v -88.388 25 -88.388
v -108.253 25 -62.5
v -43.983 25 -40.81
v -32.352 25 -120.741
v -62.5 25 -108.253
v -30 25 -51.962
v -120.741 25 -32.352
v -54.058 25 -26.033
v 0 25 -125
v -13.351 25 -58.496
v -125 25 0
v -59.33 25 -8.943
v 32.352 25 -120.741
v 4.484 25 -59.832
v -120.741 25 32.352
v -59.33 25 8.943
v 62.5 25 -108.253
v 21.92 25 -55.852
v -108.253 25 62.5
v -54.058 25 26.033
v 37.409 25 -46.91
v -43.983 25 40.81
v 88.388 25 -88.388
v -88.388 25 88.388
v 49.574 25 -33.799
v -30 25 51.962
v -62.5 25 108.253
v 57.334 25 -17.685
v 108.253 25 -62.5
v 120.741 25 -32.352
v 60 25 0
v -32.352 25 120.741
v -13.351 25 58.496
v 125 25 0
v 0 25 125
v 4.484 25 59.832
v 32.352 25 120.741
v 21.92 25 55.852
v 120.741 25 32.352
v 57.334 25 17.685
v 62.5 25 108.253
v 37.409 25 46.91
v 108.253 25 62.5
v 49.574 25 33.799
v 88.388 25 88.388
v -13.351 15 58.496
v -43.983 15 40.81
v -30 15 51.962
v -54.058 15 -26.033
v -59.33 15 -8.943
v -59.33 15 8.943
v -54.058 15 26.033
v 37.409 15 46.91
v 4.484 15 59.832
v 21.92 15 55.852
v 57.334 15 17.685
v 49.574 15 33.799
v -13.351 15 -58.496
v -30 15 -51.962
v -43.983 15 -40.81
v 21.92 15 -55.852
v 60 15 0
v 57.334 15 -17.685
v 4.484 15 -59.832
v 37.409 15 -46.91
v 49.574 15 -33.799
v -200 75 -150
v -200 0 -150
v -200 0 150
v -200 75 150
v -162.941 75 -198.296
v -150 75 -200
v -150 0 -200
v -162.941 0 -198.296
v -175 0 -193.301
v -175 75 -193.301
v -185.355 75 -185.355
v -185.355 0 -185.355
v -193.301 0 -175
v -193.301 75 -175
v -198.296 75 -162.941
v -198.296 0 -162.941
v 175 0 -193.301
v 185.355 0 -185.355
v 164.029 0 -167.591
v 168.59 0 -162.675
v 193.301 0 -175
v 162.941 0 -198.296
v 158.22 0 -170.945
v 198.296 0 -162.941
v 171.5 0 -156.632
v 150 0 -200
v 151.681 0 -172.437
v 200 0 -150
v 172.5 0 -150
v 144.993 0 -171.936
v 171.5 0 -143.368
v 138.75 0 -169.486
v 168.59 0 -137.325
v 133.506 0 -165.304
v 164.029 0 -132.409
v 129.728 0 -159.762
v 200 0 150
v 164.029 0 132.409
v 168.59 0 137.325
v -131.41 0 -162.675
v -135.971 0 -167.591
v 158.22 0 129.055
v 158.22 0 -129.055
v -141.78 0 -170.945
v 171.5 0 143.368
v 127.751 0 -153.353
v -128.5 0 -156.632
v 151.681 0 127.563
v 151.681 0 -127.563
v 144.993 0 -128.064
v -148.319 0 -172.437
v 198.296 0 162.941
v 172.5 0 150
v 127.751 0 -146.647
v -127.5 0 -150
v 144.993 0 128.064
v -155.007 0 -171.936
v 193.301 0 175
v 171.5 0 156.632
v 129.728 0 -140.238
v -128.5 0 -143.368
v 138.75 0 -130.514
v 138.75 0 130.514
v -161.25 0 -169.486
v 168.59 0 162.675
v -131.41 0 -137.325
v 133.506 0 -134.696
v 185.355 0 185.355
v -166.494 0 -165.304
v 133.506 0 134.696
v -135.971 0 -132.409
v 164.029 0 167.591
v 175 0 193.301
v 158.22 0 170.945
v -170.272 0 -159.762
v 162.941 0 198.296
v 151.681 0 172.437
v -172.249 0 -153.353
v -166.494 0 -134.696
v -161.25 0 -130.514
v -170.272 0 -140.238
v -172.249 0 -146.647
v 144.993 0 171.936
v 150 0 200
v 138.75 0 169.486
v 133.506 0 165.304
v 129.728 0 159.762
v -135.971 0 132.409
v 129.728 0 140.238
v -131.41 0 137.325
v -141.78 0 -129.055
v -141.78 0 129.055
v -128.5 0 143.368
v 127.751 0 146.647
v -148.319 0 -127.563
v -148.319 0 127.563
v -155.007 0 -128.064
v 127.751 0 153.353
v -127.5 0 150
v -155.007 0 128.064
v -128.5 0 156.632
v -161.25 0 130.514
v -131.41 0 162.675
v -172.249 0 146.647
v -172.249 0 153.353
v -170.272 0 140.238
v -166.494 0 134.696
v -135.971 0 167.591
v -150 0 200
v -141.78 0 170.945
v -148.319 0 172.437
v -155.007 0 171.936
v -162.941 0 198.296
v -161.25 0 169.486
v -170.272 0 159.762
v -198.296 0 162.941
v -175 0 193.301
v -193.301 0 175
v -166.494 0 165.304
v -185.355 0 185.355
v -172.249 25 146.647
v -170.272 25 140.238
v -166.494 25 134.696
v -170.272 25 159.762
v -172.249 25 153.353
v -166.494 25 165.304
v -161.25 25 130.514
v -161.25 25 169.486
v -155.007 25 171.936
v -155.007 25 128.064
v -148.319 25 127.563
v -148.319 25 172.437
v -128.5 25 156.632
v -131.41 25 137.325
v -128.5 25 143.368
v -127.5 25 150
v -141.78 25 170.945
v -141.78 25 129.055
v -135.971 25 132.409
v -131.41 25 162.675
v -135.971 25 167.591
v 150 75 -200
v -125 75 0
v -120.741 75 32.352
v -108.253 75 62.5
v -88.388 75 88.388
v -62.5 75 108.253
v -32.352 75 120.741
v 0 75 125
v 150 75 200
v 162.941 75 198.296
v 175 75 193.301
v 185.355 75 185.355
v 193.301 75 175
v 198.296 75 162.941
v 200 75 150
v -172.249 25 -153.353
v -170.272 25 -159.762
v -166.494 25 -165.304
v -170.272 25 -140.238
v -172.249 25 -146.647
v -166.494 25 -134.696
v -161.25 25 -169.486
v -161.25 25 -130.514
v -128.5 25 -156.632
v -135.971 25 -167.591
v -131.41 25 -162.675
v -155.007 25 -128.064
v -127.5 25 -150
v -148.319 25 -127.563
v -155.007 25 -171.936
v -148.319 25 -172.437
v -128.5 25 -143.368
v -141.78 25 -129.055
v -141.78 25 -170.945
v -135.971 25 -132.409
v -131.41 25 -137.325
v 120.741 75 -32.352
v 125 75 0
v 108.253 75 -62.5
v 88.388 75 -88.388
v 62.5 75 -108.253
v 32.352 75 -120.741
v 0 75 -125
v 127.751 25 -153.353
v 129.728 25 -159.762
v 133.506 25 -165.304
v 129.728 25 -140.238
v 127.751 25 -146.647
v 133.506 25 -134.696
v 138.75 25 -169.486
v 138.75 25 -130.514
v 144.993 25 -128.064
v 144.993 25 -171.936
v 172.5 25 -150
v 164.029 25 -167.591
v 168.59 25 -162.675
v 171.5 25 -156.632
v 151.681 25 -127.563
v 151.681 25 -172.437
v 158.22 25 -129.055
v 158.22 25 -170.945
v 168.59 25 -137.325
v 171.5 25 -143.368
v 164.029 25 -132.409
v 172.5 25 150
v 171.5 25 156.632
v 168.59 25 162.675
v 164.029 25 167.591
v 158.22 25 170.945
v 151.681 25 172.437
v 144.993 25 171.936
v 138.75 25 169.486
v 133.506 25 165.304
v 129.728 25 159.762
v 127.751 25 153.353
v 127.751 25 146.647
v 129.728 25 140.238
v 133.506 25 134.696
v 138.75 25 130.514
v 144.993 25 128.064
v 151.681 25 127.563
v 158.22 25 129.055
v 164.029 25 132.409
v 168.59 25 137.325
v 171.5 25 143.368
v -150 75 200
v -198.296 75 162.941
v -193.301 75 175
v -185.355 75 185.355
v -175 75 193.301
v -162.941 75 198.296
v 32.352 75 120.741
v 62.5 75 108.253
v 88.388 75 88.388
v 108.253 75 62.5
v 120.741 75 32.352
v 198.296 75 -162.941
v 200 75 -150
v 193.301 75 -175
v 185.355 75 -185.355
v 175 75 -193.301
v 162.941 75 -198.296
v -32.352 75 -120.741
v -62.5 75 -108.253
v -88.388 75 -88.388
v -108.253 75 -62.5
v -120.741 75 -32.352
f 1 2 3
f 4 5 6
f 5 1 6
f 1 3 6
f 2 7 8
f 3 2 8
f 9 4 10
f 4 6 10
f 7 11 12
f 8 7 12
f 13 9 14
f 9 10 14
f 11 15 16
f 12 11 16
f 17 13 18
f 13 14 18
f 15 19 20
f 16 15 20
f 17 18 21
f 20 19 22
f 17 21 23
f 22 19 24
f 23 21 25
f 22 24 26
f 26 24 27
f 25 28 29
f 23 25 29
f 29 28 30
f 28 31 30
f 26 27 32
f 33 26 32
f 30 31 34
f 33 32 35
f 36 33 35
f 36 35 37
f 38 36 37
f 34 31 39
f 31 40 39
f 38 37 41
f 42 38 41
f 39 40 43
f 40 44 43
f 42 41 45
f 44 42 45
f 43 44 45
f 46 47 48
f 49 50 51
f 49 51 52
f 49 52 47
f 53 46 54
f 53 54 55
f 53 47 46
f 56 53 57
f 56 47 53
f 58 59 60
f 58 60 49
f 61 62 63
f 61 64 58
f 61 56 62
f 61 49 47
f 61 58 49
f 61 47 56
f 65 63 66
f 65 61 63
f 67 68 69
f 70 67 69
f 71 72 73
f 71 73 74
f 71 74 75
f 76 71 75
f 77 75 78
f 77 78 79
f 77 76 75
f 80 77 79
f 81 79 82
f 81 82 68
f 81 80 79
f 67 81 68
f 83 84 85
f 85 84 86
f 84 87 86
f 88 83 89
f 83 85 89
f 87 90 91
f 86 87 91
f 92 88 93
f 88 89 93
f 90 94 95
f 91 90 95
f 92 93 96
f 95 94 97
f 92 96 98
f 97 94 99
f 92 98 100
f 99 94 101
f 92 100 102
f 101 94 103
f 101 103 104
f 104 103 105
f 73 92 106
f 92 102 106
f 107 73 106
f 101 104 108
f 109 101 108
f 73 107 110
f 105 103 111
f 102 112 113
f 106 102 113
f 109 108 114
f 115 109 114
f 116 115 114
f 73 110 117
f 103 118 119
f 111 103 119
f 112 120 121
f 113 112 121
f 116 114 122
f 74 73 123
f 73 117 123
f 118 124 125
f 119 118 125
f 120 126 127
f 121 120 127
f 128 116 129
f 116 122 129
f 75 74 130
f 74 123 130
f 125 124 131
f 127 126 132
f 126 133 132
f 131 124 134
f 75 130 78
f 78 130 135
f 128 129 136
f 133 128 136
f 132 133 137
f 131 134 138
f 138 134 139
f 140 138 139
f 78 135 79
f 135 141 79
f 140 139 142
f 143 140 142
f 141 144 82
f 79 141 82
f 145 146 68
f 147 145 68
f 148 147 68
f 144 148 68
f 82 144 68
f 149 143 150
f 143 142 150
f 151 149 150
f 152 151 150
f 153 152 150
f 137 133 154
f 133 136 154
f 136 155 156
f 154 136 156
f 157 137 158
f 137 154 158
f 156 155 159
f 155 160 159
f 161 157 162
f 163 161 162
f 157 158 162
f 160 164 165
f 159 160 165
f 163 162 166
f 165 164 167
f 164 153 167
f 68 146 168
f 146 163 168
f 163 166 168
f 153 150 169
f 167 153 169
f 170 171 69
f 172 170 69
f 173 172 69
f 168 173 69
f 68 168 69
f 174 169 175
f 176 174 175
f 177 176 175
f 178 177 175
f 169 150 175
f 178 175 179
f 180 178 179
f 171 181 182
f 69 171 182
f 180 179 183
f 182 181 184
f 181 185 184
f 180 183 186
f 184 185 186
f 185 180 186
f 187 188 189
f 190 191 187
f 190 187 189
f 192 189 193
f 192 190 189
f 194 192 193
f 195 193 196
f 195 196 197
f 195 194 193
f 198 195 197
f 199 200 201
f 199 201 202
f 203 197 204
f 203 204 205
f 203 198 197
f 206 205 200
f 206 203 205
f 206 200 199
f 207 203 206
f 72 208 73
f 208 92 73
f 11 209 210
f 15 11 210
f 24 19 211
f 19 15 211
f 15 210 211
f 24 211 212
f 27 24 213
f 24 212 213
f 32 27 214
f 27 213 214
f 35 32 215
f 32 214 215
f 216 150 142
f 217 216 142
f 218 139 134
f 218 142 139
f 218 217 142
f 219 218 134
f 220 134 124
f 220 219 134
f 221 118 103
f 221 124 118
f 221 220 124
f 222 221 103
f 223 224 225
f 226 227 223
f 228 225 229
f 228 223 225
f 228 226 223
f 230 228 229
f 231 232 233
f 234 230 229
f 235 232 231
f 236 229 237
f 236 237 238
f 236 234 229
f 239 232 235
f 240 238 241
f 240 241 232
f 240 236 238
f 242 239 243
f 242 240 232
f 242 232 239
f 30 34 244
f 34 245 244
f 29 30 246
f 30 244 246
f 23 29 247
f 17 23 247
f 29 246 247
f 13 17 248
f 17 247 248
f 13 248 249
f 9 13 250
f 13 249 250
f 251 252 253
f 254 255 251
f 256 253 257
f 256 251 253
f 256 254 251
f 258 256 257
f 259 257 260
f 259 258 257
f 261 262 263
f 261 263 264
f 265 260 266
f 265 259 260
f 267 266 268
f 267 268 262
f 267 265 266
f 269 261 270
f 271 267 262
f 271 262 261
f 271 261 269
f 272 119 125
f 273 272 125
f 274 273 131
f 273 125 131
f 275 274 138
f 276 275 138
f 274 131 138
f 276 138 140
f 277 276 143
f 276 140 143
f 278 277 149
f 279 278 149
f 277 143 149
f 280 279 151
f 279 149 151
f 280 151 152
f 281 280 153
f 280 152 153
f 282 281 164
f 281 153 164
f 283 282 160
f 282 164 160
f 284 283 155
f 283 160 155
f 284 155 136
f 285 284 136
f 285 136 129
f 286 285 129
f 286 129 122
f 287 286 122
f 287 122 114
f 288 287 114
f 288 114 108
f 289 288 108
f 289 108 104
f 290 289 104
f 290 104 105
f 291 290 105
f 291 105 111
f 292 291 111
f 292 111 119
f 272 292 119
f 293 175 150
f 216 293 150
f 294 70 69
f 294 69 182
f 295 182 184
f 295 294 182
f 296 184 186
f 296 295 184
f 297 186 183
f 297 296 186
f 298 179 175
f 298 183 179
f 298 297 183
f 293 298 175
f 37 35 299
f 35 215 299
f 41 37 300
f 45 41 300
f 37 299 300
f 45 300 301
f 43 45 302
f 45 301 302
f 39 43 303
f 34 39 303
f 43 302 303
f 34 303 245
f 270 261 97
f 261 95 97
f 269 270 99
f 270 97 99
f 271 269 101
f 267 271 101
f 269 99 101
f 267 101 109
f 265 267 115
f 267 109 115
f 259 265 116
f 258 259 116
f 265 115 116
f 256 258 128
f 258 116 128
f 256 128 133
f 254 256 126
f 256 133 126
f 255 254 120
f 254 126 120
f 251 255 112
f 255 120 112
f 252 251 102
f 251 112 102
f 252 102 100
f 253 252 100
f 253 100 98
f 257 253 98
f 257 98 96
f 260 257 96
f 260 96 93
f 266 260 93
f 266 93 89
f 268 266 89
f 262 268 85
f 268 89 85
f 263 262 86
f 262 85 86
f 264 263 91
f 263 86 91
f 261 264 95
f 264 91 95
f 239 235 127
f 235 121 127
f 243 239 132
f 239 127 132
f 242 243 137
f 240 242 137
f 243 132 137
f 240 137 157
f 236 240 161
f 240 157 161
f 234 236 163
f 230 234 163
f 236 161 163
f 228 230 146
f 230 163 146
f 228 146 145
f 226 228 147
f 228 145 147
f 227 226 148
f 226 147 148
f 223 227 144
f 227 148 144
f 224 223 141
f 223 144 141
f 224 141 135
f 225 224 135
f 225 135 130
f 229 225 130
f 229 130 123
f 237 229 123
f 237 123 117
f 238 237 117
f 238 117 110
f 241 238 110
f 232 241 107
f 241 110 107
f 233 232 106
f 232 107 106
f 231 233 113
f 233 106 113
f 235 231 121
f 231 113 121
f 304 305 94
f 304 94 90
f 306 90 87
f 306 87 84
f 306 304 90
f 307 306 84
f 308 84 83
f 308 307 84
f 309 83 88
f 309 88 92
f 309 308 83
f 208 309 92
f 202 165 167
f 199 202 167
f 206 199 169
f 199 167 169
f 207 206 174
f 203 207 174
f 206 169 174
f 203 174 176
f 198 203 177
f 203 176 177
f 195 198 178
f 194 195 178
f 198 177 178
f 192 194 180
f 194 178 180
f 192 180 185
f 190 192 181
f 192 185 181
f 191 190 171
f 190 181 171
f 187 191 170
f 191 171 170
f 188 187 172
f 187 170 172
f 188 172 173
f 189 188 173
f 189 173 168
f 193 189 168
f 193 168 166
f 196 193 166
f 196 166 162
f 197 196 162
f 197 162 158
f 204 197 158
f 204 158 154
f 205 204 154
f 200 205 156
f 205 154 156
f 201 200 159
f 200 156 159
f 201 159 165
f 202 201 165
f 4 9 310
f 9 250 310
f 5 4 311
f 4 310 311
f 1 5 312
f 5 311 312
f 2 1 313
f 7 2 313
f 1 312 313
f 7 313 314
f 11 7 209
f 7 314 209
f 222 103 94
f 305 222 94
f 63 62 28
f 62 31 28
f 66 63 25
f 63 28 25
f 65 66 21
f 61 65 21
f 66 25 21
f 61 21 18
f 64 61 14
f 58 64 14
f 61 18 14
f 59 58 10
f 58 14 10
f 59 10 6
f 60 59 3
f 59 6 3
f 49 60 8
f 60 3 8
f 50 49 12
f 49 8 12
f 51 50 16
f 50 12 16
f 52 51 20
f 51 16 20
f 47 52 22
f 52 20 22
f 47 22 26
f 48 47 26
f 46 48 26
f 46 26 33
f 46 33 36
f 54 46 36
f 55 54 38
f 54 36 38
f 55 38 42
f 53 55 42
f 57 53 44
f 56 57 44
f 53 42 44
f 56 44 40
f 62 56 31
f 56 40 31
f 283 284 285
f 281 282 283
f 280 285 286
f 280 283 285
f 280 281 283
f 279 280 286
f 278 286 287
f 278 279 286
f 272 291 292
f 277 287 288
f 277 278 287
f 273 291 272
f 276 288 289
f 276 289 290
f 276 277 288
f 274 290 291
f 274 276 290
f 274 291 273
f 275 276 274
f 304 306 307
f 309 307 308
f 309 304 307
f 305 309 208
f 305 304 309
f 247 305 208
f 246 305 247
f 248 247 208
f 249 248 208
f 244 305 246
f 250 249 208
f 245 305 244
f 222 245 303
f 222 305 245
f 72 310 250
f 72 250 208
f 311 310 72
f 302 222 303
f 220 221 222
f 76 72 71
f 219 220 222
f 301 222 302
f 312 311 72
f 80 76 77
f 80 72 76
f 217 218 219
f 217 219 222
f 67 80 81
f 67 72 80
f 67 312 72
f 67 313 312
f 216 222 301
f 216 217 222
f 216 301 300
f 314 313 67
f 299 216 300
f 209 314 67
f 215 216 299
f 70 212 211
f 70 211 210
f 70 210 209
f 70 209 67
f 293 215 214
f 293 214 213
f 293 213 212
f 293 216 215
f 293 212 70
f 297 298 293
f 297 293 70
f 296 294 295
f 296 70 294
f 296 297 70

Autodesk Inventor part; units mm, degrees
ref_plane "YZ Plane" through (0, 0, 0) normal (1, 0, 0) x (0, 1, 0)
ref_plane "XZ Plane" through (0, 0, 0) normal (0, 1, 0) x (-1, 0, 0)
ref_plane "XY Plane" through (0, 0, 0) normal (0, 0, 1) x (1, 0, 0)
sketch "Sketch1" plane through (0, 0, 0) normal (0, 1, 0) x (-1, 0, 0)
  line L0 (125, 125) -> (-125, 125)
  line L1 (-125, 125) -> (-125, -125)
  line L2 (-125, -125) -> (125, -125)
  line L3 (125, -125) -> (125, 125)
  line L4 (125, 125) -> (-125, -125) construction
  line L5 (-125, 125) -> (125, -125) construction
  line L6 (-200, -200) -> (200, -200)
  line L7 (200, -200) -> (200, 200)
  line L8 (200, 200) -> (-200, 200)
  line L9 (-200, 200) -> (-200, -200)
  line L10 (-200, -200) -> (200, 200) construction
  line L11 (200, -200) -> (-200, 200) construction
  point P0 (0, 0)
  dimension "d0" = 250
  dimension "d1" = 250
  dimension "d2" = 400
  dimension "d3" = 400
extrude "Extrusion1" add sketch "Sketch1" along normal blind 75
sketch "Sketch2" plane through (0, 0, 0) normal (0, -1, 0) x (1, 0, 0)
  line L0 (-125, -125) -> (125, -125) projected
  line L1 (125, 125) -> (-125, 125)
  line L2 (-125, 125) -> (-125, -125)
  line L3 (-125, -125) -> (125, -125)
  line L4 (125, -125) -> (125, 125)
  line L5 (125, 125) -> (-125, -125) construction
  line L6 (-125, 125) -> (125, -125) construction
  point P0 (0, 0)
extrude "Extrusion2" add sketch "Sketch2" against normal blind 25
fillet "Fillet1" radius 50 4 edges at (200, 37.5, -200) (200, 37.5, 200) (-200, 37.5, -200) (-200, 37.5, 200)
sketch "Sketch3" plane through (0, 0, 0) normal (0, -1, 0) x (1, 0, 0)
  circle A0 centre (150, -150) radius 22.5
  arc A1 (150, -200) -> (200, -150) centre (150, -150) ccw projected
  circle A2 centre (-150, -150) radius 22.5
  circle A3 centre (-150, 150) radius 22.5
  circle A4 centre (150, 150) radius 22.5
  arc A5 (-200, -150) -> (-150, -200) centre (-150, -150) ccw projected
  arc A6 (-150, 200) -> (-200, 150) centre (-150, 150) ccw projected
  arc A7 (200, 150) -> (150, 200) centre (150, 150) ccw projected
  point P0 (0, 0)
  dimension "d9" = 45
  dimension "d10" = 45
  dimension "d11" = 45
  dimension "d12" = 45
extrude "Extrusion3" cut sketch "Sketch3" against normal blind 25
fillet "Fillet2" radius 125 4 edges at (-125, 50, -125) (-125, 50, 125) (125, 50, -125) (125, 50, 125)
sketch "Sketch4" plane through (0, 25, 0) normal (0, 1, 0) x (1, 0, 0)
  circle A0 centre (0, 0) radius 60
  dimension "d16" = 120
extrude "Extrusion4" cut sketch "Sketch4" against normal blind 10
properties part number "HANDBASE2"
